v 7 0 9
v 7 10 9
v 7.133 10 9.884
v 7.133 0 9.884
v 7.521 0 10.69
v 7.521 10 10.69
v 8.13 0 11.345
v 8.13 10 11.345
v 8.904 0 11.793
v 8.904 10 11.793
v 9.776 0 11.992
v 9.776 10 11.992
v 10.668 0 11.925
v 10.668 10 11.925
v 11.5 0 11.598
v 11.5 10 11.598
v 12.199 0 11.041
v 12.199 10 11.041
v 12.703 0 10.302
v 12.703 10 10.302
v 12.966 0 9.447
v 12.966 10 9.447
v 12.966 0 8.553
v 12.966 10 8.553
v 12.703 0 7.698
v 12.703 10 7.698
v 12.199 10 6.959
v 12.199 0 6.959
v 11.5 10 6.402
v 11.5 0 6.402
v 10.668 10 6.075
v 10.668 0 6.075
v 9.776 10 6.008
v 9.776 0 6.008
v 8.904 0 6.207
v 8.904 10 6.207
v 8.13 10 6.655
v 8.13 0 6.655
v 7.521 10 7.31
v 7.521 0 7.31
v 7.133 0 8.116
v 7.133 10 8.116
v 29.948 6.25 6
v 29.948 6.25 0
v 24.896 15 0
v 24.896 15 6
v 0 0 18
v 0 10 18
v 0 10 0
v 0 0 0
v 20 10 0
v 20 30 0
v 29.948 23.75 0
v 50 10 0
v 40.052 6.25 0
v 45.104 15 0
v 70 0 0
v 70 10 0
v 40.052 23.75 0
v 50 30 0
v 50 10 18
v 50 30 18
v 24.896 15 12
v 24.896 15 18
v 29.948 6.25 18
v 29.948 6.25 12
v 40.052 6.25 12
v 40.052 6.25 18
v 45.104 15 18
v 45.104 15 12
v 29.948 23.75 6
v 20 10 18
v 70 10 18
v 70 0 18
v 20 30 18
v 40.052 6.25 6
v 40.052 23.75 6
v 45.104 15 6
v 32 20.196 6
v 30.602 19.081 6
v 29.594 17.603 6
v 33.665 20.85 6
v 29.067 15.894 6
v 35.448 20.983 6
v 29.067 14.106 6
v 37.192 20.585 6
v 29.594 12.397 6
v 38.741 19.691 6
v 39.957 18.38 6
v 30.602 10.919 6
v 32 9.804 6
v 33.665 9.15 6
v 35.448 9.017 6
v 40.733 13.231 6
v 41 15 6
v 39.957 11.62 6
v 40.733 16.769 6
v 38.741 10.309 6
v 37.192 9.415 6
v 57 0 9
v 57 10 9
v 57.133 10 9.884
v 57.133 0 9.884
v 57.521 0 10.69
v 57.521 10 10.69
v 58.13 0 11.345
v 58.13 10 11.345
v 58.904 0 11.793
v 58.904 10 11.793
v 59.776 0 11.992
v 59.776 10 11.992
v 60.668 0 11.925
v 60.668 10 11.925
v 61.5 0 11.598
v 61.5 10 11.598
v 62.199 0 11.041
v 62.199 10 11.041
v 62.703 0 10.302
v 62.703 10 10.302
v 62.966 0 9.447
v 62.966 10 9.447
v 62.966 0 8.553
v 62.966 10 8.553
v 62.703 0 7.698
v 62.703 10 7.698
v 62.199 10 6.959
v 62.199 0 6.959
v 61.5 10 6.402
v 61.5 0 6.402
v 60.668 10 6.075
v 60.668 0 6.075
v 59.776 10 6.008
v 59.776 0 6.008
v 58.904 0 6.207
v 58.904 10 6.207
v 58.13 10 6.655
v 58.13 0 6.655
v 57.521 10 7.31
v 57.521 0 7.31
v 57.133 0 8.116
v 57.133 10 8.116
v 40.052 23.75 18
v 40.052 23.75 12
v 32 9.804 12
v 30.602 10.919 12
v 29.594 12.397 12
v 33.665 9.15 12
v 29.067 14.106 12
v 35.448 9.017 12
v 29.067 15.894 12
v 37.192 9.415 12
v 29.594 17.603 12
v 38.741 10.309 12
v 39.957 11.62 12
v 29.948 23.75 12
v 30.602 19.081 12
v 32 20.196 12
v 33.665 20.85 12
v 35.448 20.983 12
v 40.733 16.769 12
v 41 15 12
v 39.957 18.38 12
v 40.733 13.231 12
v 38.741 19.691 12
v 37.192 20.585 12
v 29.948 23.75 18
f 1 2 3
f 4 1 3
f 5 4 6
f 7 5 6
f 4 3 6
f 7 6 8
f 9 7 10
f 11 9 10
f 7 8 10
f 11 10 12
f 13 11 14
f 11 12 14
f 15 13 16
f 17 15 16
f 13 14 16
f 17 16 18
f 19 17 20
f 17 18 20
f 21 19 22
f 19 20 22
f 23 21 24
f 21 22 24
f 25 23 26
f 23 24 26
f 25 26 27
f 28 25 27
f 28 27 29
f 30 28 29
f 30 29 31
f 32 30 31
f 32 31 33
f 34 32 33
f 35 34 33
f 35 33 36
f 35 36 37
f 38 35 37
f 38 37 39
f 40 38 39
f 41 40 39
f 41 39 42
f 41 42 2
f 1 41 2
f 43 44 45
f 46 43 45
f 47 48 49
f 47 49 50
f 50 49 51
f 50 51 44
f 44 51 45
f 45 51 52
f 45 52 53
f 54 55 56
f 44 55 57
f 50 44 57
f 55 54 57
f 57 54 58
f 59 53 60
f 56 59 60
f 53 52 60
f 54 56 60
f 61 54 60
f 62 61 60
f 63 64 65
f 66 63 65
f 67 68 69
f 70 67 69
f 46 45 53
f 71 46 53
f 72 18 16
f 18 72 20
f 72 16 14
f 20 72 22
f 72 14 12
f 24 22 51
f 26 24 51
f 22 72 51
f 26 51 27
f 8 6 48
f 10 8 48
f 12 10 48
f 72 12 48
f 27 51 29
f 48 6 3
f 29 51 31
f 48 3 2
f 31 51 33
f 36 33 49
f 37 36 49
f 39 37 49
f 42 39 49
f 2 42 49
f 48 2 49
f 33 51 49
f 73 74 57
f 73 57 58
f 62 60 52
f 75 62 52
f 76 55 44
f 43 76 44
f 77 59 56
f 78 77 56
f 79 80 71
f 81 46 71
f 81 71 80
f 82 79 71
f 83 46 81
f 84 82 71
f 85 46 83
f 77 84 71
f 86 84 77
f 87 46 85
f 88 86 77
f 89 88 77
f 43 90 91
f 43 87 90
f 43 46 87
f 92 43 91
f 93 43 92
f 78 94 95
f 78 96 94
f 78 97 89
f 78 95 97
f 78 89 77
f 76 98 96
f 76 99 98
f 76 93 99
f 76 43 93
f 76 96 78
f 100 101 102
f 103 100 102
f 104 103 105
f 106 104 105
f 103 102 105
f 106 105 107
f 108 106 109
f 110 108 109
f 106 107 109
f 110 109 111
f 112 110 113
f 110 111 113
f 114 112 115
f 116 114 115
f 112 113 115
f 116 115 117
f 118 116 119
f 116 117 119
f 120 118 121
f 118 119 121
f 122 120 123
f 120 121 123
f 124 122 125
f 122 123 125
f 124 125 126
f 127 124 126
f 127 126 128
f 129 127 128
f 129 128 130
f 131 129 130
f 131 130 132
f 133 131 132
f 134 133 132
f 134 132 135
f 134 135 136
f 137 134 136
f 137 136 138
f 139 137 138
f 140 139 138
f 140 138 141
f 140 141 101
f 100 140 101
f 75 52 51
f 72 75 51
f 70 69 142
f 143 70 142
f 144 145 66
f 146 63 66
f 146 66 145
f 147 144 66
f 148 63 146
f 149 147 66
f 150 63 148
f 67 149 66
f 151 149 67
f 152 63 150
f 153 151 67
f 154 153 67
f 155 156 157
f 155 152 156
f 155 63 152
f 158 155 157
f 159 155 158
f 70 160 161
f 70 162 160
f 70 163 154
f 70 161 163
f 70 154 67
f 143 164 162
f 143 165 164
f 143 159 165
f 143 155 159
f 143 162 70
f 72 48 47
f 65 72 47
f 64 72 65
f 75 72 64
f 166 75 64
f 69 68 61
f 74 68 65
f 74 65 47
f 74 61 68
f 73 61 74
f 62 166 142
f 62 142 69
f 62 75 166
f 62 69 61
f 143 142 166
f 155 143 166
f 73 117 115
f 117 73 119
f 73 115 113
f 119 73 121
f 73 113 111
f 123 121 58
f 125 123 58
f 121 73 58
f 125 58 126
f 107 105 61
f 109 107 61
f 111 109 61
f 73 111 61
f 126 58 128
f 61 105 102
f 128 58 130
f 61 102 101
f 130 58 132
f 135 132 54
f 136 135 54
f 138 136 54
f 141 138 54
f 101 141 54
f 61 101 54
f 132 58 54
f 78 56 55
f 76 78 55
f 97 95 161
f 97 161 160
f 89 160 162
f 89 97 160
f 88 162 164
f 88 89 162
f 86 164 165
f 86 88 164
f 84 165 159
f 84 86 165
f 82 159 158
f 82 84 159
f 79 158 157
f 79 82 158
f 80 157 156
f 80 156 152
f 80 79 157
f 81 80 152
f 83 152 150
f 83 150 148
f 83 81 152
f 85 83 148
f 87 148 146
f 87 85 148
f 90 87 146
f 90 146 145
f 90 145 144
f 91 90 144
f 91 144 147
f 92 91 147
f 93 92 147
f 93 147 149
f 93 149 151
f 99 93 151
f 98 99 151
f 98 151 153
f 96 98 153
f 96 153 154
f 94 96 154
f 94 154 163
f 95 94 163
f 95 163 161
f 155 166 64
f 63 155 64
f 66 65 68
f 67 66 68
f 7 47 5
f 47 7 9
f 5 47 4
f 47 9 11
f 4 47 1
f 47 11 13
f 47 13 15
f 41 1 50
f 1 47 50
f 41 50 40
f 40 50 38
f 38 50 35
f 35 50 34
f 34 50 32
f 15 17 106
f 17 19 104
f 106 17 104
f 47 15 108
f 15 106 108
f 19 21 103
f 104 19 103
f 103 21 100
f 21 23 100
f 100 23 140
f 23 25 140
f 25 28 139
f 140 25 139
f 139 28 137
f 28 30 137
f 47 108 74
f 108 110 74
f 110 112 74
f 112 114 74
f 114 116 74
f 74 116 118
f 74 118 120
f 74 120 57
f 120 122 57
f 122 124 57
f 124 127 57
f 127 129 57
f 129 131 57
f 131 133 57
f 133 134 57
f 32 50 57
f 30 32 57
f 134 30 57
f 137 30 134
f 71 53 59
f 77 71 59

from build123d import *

# Parameters (mm, degrees)
F0_R     = 6
F1_DEPTH = 18
F2_R     = 6
F3_DEPTH = 6
F4_R     = 3
F5_DEPTH = 25
F6_R     = 6
F7_DEPTH = 6


with BuildPart() as f1:
    # F0 (on Top) → F1 (new body)
    with BuildSketch(Plane.XY):
        Polygon((0, 10), (0, 0), (70, 0), (70, 10), (50, 10), (50, 30), (20, 30), (20, 10), align=None)
        with Locations((35, 15)):
            Circle(F0_R, mode=Mode.SUBTRACT)
    extrude(amount=F1_DEPTH)

    # F2 (on face) → F3 (cut)
    with BuildSketch(Plane.XY.offset(18)):
        Polygon((40.051815, 23.75), (29.948185, 23.75), (24.89637, 15), (29.948185, 6.25), (40.051815, 6.25), (45.10363, 15), align=None)
        with Locations((35, 15)):
            Circle(F2_R, mode=Mode.SUBTRACT)
    extrude(amount=-F3_DEPTH, mode=Mode.SUBTRACT)

    # F4 (on face) → F5 (cut)
    with BuildSketch(Plane(origin=(0, 10, 0), x_dir=(-1, 0, 0), z_dir=(0, 1, 0))):
        with Locations((-60, 9)):
            Circle(F4_R)
        with Locations((-10, 9)):
            Circle(F4_R)
    extrude(amount=-F5_DEPTH, mode=Mode.SUBTRACT)

    # F6 (on face) → F7 (cut)
    with BuildSketch(Plane(origin=(0, 0, 0), x_dir=(1, 0, 0), z_dir=(0, 0, -1))):
        Polygon((29.948185, -23.75), (40.051815, -23.75), (45.10363, -15), (40.051815, -6.25), (29.948185, -6.25), (24.89637, -15), align=None)
        with Locations((35, -15)):
            Circle(F6_R, mode=Mode.SUBTRACT)
    extrude(amount=-F7_DEPTH, mode=Mode.SUBTRACT)


solid = f1.part
